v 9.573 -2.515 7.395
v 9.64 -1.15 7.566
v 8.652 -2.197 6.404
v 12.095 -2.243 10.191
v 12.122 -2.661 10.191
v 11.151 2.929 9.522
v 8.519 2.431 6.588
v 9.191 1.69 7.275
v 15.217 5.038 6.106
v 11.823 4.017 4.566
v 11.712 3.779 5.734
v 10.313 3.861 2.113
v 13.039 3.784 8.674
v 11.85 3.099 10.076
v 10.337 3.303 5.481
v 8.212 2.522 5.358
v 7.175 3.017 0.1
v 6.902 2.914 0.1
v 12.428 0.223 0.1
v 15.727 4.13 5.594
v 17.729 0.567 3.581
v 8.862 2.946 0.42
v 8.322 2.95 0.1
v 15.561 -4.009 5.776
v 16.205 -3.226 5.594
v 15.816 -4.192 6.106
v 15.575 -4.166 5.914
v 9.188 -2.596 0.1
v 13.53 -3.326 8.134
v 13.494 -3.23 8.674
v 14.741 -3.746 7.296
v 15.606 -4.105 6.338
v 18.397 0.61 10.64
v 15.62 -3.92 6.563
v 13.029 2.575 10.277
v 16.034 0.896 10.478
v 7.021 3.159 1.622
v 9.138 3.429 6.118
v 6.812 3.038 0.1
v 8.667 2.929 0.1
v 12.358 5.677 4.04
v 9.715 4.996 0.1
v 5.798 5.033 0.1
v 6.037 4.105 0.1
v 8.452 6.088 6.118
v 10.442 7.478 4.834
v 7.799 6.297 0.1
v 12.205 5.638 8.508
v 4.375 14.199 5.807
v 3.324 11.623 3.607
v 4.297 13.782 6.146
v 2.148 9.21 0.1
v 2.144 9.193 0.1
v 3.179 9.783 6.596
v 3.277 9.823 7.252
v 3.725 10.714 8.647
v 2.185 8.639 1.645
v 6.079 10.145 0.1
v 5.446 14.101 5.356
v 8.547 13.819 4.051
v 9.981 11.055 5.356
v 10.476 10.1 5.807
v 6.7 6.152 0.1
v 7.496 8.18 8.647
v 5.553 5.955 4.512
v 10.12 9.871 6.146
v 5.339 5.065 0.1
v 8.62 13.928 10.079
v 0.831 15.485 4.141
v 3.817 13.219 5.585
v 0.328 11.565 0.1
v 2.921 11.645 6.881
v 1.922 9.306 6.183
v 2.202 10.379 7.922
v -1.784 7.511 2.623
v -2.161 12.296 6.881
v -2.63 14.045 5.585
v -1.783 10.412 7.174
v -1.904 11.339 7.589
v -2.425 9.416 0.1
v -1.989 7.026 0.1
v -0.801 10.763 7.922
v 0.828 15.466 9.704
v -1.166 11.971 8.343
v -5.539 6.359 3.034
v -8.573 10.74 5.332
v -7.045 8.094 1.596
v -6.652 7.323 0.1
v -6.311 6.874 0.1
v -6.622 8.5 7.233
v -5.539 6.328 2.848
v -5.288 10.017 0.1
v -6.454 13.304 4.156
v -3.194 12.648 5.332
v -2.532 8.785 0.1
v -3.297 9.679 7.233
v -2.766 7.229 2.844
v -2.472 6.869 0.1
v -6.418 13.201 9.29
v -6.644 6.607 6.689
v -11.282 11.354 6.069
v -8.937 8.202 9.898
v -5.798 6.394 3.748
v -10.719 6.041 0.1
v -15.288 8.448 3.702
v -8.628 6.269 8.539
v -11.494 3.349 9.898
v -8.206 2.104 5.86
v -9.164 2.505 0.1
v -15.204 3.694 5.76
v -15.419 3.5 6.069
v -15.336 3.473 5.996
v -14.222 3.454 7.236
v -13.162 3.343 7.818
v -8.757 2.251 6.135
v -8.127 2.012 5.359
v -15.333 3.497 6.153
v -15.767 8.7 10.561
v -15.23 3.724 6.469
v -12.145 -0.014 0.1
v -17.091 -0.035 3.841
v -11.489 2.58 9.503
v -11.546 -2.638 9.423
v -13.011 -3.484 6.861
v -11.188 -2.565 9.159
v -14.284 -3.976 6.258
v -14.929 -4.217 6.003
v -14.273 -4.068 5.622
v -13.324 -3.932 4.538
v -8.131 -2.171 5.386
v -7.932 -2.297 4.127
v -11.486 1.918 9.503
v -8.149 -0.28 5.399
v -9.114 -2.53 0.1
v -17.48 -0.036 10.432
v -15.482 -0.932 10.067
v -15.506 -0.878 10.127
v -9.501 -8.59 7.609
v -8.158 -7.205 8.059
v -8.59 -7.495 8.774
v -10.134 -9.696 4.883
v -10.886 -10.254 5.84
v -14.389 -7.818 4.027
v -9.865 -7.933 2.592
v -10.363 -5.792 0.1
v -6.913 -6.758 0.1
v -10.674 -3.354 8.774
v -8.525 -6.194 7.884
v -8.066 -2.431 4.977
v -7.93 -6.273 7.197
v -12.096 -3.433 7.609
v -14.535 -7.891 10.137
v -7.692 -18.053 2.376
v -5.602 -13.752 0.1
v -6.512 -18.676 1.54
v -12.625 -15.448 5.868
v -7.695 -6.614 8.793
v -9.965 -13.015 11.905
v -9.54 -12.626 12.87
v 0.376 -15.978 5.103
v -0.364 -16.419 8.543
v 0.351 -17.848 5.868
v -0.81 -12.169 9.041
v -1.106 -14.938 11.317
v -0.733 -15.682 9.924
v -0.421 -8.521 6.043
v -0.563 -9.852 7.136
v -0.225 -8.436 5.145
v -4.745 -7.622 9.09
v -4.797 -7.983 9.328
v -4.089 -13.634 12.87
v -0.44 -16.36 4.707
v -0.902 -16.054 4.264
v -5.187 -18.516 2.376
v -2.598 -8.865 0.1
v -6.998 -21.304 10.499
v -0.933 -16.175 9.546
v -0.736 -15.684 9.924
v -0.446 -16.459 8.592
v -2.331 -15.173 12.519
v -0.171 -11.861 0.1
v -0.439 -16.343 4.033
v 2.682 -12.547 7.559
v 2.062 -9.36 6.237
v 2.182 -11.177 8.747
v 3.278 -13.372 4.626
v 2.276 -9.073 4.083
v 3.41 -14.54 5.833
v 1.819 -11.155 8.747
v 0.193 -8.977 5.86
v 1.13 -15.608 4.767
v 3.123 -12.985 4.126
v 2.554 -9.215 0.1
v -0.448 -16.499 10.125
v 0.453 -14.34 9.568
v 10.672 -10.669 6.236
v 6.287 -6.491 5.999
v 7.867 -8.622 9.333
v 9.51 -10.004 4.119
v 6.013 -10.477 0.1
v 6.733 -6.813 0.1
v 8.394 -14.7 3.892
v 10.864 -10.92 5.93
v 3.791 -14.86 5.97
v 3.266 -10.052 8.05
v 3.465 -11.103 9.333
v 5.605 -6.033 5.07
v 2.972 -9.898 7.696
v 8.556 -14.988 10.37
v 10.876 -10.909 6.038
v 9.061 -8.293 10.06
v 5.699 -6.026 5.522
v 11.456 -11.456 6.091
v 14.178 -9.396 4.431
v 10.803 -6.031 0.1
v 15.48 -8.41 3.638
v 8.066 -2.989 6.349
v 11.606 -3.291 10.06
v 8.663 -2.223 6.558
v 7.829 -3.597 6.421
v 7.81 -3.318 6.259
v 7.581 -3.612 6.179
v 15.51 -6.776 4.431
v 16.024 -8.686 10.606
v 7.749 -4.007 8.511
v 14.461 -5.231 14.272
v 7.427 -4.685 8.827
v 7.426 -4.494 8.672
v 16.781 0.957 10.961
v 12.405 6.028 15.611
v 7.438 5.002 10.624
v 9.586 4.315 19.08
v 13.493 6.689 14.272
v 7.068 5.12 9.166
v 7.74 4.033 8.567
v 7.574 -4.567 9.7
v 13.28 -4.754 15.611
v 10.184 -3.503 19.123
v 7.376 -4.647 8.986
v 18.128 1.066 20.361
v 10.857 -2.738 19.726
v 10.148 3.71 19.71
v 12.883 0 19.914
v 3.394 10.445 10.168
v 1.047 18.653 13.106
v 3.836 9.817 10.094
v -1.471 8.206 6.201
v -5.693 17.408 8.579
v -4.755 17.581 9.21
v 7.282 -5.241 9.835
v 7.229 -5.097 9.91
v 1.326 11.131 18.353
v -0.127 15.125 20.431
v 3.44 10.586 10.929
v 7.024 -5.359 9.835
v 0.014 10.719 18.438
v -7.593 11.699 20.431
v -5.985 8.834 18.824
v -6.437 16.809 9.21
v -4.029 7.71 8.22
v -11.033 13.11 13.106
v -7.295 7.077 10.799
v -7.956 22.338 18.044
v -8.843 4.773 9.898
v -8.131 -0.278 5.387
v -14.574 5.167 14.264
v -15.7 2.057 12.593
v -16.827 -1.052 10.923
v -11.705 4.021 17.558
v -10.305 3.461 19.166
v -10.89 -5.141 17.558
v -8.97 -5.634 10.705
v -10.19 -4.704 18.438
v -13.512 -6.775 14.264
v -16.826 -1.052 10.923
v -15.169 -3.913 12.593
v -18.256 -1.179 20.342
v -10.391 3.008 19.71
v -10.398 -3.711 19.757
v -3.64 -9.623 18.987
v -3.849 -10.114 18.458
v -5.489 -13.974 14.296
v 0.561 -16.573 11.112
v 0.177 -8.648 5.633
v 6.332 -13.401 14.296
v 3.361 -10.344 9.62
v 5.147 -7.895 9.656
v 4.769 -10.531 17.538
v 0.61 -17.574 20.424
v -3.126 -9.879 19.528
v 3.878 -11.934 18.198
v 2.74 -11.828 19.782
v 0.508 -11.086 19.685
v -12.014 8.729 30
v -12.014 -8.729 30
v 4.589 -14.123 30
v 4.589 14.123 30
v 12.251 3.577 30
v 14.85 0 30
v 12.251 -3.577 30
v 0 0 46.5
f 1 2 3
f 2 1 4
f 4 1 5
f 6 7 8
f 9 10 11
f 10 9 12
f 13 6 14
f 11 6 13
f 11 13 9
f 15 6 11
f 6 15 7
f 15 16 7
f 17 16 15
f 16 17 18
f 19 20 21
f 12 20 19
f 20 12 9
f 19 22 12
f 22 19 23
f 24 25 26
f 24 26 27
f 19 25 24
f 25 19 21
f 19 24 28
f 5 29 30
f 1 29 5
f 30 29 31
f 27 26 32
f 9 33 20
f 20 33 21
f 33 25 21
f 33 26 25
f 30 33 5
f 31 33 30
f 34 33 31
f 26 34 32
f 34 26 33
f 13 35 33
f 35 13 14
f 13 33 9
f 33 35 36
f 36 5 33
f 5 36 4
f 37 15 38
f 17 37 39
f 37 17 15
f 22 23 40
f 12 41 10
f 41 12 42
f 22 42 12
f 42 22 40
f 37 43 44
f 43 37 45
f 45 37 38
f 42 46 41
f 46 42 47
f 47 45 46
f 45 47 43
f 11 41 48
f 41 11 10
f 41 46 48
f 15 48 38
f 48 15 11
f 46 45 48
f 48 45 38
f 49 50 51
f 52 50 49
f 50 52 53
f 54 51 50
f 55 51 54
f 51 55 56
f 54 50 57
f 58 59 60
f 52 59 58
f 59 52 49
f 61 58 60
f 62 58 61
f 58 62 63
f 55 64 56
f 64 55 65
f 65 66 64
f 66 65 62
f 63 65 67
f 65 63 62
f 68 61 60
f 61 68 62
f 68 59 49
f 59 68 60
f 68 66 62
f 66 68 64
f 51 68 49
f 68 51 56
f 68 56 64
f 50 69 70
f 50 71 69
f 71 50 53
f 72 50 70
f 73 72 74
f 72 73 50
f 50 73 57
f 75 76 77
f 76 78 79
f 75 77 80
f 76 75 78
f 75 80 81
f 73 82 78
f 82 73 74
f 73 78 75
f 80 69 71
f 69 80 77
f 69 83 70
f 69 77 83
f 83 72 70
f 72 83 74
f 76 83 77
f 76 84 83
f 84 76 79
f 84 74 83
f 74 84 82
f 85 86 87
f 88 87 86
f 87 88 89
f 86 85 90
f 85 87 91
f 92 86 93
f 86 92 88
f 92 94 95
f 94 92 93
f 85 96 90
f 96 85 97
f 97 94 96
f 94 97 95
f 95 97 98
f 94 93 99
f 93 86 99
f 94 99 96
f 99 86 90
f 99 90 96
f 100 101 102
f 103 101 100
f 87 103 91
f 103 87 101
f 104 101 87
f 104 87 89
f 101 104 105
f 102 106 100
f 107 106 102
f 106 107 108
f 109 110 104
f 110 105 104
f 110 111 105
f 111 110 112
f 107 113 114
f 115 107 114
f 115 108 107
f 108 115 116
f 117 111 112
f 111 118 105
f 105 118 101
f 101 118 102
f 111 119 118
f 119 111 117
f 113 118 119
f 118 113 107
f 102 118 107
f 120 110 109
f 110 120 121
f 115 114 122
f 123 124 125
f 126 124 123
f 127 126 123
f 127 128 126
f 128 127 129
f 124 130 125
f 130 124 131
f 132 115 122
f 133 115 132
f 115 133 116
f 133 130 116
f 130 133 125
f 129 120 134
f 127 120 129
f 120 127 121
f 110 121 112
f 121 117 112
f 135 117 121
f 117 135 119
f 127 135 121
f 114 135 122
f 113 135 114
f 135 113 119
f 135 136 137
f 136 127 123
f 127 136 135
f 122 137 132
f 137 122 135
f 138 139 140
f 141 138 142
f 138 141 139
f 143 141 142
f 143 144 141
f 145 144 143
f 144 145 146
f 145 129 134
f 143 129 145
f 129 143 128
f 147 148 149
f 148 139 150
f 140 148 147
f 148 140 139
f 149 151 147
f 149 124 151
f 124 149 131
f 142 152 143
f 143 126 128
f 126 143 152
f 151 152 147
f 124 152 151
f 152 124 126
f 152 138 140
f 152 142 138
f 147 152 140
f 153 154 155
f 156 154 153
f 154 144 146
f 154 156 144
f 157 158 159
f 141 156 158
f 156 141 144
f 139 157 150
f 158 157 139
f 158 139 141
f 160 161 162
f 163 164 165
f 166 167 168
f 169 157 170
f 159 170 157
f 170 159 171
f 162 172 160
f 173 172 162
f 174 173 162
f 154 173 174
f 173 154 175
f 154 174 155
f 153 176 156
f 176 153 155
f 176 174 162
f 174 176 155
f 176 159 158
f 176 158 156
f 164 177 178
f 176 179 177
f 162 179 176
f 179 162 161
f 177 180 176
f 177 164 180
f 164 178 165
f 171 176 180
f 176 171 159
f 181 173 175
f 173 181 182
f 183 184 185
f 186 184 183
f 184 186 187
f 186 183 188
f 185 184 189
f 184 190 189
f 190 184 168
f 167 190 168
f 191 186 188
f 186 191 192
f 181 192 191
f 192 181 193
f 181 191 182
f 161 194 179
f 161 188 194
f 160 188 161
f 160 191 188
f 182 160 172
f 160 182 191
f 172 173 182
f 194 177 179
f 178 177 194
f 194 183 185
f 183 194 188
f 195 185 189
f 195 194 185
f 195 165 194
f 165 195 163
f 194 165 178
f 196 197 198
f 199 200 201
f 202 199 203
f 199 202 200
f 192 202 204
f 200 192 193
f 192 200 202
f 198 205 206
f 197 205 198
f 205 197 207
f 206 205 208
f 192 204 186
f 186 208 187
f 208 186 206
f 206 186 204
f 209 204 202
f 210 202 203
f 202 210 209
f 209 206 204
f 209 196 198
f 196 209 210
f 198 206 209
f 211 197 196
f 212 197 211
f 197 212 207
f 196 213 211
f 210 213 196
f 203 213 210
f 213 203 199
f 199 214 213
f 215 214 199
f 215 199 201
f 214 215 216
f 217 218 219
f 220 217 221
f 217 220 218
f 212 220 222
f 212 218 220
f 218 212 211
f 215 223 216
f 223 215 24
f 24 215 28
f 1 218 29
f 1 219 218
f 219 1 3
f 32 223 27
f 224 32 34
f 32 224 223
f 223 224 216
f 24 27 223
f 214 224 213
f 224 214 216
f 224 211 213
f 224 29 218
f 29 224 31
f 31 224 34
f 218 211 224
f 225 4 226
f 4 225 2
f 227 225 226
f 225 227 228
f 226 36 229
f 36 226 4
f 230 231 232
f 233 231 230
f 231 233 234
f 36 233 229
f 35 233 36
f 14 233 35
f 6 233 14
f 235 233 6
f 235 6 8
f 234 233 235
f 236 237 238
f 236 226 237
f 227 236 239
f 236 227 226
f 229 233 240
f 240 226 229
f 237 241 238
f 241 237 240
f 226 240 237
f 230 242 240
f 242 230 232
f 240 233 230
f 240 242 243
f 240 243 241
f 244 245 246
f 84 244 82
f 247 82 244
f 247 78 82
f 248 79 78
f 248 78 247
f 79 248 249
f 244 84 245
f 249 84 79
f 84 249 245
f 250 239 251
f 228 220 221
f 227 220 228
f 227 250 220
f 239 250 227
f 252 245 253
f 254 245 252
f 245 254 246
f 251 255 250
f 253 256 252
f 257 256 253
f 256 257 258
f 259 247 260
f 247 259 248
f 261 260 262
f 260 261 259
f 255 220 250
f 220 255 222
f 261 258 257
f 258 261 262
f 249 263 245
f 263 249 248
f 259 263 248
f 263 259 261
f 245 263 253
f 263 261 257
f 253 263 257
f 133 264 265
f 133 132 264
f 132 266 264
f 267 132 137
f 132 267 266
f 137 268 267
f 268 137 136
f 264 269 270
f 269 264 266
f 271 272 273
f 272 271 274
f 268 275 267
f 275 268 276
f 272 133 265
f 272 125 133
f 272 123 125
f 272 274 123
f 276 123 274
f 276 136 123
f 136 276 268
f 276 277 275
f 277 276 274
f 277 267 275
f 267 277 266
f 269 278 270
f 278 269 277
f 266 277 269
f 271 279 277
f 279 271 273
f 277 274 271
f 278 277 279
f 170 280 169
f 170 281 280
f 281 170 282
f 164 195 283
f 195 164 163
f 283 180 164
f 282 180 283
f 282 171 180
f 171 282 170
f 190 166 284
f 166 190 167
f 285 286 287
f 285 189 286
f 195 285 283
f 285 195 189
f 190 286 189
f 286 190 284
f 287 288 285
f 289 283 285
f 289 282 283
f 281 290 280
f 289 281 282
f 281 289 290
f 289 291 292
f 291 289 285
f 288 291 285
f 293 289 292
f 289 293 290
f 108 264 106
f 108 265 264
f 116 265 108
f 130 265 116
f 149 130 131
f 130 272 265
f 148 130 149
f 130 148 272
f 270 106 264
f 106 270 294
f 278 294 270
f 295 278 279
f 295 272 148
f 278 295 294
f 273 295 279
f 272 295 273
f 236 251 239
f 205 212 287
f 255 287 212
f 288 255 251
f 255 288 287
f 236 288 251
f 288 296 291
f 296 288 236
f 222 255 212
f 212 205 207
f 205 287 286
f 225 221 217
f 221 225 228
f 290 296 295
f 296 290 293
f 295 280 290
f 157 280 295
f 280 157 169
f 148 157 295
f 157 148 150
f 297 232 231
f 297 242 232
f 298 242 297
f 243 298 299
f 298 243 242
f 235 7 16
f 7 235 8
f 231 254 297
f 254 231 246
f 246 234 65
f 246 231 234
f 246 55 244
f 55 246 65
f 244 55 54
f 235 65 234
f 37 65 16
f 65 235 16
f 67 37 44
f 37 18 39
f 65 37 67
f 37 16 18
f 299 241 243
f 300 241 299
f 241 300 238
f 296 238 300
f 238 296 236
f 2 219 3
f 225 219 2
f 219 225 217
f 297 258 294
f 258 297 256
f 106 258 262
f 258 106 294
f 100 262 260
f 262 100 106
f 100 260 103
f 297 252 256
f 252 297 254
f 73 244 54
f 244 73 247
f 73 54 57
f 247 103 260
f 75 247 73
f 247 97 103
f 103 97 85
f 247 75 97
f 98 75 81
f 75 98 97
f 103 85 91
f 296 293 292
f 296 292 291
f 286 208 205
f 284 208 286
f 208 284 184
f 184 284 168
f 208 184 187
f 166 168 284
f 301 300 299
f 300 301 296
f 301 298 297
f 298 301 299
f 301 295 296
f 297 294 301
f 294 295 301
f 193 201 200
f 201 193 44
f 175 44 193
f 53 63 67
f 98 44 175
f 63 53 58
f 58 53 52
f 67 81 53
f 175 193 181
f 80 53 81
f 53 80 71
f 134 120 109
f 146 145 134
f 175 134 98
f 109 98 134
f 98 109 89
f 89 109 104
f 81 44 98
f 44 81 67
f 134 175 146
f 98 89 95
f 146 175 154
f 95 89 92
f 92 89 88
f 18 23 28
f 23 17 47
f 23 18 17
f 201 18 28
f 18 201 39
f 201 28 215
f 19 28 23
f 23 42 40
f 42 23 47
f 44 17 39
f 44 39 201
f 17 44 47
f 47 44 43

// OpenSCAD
// crystals! A script to generate random crystal formations

use <MCAD/regular_shapes.scad>


module crystal(radius, wideness, height, point_to_neck_ratio) {
    linear_extrude(height, center = true, convexity = 10, scale=wideness)
        pentagon(radius);

    translate([0,0,height/2])
        linear_extrude(height*point_to_neck_ratio, center = false, convexity = 10, scale=0)
            pentagon(radius*wideness);
}

module crystal_ring(radius, num_crystals, slant, min_radius, max_radius, min_height, max_height, angle_variation = 0) {
    step = 360/num_crystals;
    for (i=[0:step:359]) {
        rand_radius = rands(min_radius,max_radius,1, seed*i*radius)[0];
        rand_height = rands(min_height,max_height,1, seed*i*radius)[0];
        rand_angle = rands(-angle_variation,angle_variation,1, seed*i*radius)[0];
        angle = i;
        dx = radius*cos(angle);
        dy = radius*sin(angle);
        translate([dx,dy,rand_height/2])
            rotate([0,slant+rand_angle,angle + rand_angle])
                crystal(rand_radius, 1.75, rand_height, 0.35);
    }    
}

seed = 4;


translate([0,0,-5])
difference() {
    union() {
        //crystal_ring(10, 4, 6, 8, 15, 16);
        crystal_ring(radius=9, num_crystals=12, slant=45, min_radius=1, max_radius=4, min_height=10, max_height=18, angle_variation=20);
        //crystal_ring(10, 12, 45, 1, 4, 5, max_height=18, 20);

        translate([0,0,4])
        crystal_ring(5, 4, 45, 3, 4, 15, 24, angle_variation=25);
        
        // big center crystal
        translate([0,0,20])
        crystal(9, 1.65, 30, 0.55);
    }
    //cylinder to cut off the bottom, clean it up and make it one solid area
    translate([0,0,-1.9])
        cylinder(7, 25, 25);
}
